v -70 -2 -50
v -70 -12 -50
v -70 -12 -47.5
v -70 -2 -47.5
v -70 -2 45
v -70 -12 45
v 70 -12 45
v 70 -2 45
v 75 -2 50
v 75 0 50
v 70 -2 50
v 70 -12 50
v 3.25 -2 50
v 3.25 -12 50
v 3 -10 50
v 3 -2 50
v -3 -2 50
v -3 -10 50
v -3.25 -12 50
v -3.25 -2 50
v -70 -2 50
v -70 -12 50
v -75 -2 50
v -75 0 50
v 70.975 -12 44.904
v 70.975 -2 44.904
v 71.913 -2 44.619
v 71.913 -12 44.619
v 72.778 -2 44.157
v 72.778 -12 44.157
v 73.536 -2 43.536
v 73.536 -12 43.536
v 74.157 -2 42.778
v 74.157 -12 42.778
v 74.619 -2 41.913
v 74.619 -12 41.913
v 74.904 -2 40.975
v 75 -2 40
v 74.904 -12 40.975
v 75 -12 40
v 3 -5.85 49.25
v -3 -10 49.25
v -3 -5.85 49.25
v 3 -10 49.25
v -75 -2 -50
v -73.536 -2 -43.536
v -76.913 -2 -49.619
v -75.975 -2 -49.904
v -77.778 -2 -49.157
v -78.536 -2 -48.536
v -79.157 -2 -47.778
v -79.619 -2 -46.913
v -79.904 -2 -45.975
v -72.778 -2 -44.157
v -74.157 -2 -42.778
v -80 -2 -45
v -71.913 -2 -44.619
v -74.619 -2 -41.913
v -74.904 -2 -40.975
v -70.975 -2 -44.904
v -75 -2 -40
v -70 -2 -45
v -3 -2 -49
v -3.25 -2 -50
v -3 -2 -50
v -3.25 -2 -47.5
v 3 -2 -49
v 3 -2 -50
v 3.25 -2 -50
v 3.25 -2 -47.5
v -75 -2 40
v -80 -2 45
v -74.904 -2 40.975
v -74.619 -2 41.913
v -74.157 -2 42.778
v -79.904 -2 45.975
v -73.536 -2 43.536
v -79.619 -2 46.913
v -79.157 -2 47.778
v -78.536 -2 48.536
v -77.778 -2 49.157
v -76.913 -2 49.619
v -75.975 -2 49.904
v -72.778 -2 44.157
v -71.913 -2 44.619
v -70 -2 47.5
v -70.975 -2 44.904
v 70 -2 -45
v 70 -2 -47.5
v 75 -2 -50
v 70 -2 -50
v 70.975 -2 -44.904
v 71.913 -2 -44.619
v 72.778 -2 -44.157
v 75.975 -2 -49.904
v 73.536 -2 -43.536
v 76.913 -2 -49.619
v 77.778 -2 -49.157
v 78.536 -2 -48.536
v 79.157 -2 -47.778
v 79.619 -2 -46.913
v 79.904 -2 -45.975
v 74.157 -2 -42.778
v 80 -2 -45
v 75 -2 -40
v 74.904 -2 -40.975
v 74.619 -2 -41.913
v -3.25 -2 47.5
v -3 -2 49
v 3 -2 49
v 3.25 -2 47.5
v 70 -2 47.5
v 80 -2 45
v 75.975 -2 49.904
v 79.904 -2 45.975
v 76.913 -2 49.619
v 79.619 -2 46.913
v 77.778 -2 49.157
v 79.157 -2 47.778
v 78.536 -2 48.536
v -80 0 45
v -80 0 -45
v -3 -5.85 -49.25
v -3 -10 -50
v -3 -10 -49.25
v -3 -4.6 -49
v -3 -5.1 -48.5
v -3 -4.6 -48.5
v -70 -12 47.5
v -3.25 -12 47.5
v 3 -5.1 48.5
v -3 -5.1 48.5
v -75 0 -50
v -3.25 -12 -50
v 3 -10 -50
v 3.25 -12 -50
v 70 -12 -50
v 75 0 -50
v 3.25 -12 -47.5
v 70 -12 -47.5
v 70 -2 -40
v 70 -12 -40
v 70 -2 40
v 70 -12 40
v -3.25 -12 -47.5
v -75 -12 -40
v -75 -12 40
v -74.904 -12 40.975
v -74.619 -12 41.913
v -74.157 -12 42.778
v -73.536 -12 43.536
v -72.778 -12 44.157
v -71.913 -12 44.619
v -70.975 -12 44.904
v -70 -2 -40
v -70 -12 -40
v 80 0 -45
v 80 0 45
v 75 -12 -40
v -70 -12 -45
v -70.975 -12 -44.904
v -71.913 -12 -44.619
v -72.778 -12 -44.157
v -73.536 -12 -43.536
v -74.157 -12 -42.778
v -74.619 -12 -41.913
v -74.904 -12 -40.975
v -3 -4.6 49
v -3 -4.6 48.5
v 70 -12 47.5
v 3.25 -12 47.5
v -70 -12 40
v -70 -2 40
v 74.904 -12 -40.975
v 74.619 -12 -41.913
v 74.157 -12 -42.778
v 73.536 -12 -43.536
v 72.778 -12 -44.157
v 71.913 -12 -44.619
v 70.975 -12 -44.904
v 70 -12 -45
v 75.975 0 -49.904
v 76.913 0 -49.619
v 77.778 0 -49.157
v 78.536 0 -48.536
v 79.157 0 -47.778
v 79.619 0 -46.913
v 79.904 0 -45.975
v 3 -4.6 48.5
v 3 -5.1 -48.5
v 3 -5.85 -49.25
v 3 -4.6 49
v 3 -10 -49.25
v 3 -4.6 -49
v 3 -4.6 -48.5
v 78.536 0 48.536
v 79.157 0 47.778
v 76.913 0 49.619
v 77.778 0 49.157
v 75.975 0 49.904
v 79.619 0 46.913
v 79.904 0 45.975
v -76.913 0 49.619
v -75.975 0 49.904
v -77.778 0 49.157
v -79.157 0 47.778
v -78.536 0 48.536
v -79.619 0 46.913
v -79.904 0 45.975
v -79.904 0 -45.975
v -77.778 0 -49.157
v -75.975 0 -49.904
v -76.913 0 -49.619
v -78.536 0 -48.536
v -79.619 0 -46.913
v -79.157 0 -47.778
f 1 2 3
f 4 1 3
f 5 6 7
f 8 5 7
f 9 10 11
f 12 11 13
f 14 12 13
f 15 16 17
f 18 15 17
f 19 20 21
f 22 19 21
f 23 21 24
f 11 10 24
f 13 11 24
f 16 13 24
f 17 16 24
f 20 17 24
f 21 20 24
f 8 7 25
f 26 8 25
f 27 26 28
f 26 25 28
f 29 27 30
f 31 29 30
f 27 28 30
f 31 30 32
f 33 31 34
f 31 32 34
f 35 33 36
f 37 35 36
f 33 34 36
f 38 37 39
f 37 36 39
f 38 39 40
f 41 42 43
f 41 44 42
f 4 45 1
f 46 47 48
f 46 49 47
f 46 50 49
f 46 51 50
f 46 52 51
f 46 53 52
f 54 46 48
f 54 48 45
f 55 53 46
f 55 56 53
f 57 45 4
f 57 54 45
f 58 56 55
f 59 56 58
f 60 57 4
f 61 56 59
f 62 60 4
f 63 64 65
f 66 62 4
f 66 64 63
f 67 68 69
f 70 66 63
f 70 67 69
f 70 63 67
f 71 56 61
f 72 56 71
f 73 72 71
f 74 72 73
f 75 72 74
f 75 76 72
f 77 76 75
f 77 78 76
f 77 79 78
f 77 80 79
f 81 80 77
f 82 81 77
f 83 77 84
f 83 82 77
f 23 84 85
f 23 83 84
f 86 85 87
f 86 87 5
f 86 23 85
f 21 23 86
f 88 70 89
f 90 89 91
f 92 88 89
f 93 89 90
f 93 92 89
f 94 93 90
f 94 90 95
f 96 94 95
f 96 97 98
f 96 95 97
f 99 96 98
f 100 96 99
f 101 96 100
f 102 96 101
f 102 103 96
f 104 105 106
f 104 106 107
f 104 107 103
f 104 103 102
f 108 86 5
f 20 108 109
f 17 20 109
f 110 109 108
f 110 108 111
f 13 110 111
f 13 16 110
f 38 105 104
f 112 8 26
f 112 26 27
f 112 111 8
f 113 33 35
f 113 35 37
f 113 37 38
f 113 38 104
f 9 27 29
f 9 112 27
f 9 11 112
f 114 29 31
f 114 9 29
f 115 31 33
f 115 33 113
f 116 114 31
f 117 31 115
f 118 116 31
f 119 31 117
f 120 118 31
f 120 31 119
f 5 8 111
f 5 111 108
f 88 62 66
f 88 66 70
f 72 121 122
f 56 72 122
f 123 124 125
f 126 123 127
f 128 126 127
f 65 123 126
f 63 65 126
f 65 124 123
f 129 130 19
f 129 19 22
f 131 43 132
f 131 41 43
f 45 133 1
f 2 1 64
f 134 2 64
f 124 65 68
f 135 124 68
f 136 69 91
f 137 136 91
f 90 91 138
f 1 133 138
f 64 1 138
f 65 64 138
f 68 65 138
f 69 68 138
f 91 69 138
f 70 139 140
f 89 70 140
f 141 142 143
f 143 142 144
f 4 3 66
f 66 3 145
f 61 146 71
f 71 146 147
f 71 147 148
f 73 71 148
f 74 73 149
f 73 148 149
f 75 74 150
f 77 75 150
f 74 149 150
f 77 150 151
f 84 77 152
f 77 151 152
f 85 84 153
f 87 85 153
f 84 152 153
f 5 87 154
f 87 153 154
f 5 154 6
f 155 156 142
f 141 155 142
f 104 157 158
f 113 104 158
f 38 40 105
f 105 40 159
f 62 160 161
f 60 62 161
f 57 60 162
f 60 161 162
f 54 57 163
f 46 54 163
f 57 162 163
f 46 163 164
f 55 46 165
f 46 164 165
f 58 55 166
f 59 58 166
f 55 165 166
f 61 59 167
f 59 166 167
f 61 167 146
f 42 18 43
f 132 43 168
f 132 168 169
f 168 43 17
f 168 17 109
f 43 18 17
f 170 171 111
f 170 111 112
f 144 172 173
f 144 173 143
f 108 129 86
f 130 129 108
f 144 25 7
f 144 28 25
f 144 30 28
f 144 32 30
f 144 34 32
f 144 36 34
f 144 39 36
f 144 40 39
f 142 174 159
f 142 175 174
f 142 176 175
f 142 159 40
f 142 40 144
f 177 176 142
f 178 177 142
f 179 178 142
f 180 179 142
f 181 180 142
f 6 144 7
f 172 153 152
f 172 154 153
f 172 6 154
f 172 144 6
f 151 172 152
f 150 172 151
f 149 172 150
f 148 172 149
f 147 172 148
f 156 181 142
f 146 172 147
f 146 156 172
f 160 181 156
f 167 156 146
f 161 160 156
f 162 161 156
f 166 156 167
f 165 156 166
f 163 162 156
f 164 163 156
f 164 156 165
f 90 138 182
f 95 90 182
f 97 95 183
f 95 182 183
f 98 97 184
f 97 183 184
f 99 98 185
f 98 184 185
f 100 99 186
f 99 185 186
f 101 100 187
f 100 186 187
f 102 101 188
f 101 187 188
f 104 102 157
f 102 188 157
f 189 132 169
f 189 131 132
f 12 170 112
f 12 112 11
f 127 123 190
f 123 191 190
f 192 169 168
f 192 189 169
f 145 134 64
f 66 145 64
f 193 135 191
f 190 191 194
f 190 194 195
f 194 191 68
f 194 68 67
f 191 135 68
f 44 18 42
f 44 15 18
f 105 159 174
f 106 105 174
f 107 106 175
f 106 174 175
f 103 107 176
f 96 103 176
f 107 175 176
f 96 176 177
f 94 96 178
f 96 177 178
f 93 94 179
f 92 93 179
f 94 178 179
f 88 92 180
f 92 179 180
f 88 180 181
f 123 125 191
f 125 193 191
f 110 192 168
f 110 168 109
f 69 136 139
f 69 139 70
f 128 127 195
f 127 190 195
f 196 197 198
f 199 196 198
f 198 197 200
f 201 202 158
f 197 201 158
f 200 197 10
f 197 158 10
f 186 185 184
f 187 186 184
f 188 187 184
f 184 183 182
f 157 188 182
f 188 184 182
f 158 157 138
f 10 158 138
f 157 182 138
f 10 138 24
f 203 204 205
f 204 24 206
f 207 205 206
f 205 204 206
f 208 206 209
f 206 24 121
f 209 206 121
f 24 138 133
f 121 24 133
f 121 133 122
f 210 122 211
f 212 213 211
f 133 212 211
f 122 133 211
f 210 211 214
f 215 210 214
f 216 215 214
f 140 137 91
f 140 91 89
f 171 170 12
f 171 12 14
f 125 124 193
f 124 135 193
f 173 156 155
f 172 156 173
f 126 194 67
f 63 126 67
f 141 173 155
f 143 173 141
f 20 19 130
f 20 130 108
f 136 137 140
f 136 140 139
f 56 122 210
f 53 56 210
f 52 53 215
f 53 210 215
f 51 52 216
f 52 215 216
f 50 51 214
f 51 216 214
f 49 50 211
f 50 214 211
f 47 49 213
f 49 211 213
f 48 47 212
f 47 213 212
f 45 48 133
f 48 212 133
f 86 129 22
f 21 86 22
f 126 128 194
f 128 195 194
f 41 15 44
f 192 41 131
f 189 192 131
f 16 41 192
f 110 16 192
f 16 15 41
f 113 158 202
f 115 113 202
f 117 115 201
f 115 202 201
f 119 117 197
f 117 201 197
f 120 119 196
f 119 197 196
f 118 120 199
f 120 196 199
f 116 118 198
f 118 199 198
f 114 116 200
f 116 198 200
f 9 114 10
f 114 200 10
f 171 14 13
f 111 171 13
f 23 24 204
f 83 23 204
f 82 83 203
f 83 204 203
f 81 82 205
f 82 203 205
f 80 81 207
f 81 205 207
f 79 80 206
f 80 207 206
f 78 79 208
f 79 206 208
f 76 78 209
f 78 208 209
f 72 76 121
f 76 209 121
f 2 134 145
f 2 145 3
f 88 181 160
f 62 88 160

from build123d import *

# Parameters (mm, degrees)
BOSS_EXTRUDE1_DEPTH = 12
SKETCH6_OUTSIDE_W   = 199.812
SKETCH6_OUTSIDE_H   = 139.812
SKETCH6_OUTSIDE_W_2 = 140
SKETCH6_OUTSIDE_H_2 = 2.5
CUT_EXTRUDE1_DEPTH  = 10
SKETCH7_W           = 140
SKETCH7_H           = 80
CUT_EXTRUDE2_DEPTH  = 10
SKETCH13_W          = 6.5
SKETCH13_H          = 10
CUT_EXTRUDE3_DEPTH  = 5
BOSS_EXTRUDE2_DEPTH = 3


with BuildPart() as part:
    # Sketch3 → Boss-Extrude1 (new body)
    with BuildSketch(Plane(origin=(0, 0, 0), x_dir=(1, 0, 0), z_dir=(0, 1, 0))):
        with BuildLine():
            Line((75, -50), (-75, -50))
            ThreePointArc((-75, -50), (-78.535533906, -48.535533906), (-80, -45))
            Line((-80, -45), (-80, 45))
            ThreePointArc((-80, 45), (-78.535533906, 48.535533906), (-75, 50))
            Line((-75, 50), (75, 50))
            ThreePointArc((75, 50), (78.535533906, 48.535533906), (80, 45))
            Line((80, 45), (80, -45))
            ThreePointArc((80, -45), (78.535533906, -48.535533906), (75, -50))
        make_face()
    extrude(amount=-BOSS_EXTRUDE1_DEPTH)

    # Sketch6 outside → Cut-Extrude1 (cut)
    with BuildSketch(Plane.XZ.offset(12)):
        Rectangle(SKETCH6_OUTSIDE_W, SKETCH6_OUTSIDE_H)
        with BuildLine():
            Line((70, -45), (-70, -45))
            ThreePointArc((-70, -45), (-73.535533906, -43.535533906), (-75, -40))
            Line((-75, -40), (-75, 40))
            ThreePointArc((-75, 40), (-73.535533906, 43.535533906), (-70, 45))
            Line((-70, 45), (70, 45))
            ThreePointArc((70, 45), (73.535533906, 43.535533906), (75, 40))
            Line((75, 40), (75, -40))
            ThreePointArc((75, -40), (73.535533906, -43.535533906), (70, -45))
        make_face(mode=Mode.SUBTRACT)
        with Locations((0, 48.75)):
            Rectangle(SKETCH6_OUTSIDE_W_2, SKETCH6_OUTSIDE_H_2, mode=Mode.SUBTRACT)
        with Locations((0, -48.75)):
            Rectangle(SKETCH6_OUTSIDE_W_2, SKETCH6_OUTSIDE_H_2, mode=Mode.SUBTRACT)
    extrude(amount=-CUT_EXTRUDE1_DEPTH, mode=Mode.SUBTRACT)

    # Sketch7 → Cut-Extrude2 (cut)
    with BuildSketch(Plane.XZ.offset(12)):
        Rectangle(SKETCH7_W, SKETCH7_H)
    extrude(amount=-CUT_EXTRUDE2_DEPTH, mode=Mode.SUBTRACT)

    # Sketch13 → Cut-Extrude3 (cut)
    with BuildSketch(Plane(origin=(0, 0, -50), x_dir=(-1, 0, 0), z_dir=(0, 0, -1))):
        with Locations((0, -7)):
            Rectangle(SKETCH13_W, SKETCH13_H)
    cut_extrude3 = extrude(amount=-CUT_EXTRUDE3_DEPTH, mode=Mode.SUBTRACT)

    # Sketch14 → Boss-Extrude2 (add, symmetric)
    with BuildSketch(Plane(origin=(0, 0, 0), x_dir=(0, 0, -1), z_dir=(1, 0, 0))):
        Polygon((50, -2), (50, -5.8), (50, -10), (49.25, -10), (49.25, -5.85), (48.5, -5.1), (48.5, -4.6), (49, -4.6), (49, -2), align=None)
    boss_extrude2 = extrude(amount=BOSS_EXTRUDE2_DEPTH, both=True)

    # Mirror1: Cut-Extrude3, Boss-Extrude2 across plane
    add(cut_extrude3.mirror(Plane.XY), mode=Mode.SUBTRACT)
    add(boss_extrude2.mirror(Plane.XY))


solid = part.part
